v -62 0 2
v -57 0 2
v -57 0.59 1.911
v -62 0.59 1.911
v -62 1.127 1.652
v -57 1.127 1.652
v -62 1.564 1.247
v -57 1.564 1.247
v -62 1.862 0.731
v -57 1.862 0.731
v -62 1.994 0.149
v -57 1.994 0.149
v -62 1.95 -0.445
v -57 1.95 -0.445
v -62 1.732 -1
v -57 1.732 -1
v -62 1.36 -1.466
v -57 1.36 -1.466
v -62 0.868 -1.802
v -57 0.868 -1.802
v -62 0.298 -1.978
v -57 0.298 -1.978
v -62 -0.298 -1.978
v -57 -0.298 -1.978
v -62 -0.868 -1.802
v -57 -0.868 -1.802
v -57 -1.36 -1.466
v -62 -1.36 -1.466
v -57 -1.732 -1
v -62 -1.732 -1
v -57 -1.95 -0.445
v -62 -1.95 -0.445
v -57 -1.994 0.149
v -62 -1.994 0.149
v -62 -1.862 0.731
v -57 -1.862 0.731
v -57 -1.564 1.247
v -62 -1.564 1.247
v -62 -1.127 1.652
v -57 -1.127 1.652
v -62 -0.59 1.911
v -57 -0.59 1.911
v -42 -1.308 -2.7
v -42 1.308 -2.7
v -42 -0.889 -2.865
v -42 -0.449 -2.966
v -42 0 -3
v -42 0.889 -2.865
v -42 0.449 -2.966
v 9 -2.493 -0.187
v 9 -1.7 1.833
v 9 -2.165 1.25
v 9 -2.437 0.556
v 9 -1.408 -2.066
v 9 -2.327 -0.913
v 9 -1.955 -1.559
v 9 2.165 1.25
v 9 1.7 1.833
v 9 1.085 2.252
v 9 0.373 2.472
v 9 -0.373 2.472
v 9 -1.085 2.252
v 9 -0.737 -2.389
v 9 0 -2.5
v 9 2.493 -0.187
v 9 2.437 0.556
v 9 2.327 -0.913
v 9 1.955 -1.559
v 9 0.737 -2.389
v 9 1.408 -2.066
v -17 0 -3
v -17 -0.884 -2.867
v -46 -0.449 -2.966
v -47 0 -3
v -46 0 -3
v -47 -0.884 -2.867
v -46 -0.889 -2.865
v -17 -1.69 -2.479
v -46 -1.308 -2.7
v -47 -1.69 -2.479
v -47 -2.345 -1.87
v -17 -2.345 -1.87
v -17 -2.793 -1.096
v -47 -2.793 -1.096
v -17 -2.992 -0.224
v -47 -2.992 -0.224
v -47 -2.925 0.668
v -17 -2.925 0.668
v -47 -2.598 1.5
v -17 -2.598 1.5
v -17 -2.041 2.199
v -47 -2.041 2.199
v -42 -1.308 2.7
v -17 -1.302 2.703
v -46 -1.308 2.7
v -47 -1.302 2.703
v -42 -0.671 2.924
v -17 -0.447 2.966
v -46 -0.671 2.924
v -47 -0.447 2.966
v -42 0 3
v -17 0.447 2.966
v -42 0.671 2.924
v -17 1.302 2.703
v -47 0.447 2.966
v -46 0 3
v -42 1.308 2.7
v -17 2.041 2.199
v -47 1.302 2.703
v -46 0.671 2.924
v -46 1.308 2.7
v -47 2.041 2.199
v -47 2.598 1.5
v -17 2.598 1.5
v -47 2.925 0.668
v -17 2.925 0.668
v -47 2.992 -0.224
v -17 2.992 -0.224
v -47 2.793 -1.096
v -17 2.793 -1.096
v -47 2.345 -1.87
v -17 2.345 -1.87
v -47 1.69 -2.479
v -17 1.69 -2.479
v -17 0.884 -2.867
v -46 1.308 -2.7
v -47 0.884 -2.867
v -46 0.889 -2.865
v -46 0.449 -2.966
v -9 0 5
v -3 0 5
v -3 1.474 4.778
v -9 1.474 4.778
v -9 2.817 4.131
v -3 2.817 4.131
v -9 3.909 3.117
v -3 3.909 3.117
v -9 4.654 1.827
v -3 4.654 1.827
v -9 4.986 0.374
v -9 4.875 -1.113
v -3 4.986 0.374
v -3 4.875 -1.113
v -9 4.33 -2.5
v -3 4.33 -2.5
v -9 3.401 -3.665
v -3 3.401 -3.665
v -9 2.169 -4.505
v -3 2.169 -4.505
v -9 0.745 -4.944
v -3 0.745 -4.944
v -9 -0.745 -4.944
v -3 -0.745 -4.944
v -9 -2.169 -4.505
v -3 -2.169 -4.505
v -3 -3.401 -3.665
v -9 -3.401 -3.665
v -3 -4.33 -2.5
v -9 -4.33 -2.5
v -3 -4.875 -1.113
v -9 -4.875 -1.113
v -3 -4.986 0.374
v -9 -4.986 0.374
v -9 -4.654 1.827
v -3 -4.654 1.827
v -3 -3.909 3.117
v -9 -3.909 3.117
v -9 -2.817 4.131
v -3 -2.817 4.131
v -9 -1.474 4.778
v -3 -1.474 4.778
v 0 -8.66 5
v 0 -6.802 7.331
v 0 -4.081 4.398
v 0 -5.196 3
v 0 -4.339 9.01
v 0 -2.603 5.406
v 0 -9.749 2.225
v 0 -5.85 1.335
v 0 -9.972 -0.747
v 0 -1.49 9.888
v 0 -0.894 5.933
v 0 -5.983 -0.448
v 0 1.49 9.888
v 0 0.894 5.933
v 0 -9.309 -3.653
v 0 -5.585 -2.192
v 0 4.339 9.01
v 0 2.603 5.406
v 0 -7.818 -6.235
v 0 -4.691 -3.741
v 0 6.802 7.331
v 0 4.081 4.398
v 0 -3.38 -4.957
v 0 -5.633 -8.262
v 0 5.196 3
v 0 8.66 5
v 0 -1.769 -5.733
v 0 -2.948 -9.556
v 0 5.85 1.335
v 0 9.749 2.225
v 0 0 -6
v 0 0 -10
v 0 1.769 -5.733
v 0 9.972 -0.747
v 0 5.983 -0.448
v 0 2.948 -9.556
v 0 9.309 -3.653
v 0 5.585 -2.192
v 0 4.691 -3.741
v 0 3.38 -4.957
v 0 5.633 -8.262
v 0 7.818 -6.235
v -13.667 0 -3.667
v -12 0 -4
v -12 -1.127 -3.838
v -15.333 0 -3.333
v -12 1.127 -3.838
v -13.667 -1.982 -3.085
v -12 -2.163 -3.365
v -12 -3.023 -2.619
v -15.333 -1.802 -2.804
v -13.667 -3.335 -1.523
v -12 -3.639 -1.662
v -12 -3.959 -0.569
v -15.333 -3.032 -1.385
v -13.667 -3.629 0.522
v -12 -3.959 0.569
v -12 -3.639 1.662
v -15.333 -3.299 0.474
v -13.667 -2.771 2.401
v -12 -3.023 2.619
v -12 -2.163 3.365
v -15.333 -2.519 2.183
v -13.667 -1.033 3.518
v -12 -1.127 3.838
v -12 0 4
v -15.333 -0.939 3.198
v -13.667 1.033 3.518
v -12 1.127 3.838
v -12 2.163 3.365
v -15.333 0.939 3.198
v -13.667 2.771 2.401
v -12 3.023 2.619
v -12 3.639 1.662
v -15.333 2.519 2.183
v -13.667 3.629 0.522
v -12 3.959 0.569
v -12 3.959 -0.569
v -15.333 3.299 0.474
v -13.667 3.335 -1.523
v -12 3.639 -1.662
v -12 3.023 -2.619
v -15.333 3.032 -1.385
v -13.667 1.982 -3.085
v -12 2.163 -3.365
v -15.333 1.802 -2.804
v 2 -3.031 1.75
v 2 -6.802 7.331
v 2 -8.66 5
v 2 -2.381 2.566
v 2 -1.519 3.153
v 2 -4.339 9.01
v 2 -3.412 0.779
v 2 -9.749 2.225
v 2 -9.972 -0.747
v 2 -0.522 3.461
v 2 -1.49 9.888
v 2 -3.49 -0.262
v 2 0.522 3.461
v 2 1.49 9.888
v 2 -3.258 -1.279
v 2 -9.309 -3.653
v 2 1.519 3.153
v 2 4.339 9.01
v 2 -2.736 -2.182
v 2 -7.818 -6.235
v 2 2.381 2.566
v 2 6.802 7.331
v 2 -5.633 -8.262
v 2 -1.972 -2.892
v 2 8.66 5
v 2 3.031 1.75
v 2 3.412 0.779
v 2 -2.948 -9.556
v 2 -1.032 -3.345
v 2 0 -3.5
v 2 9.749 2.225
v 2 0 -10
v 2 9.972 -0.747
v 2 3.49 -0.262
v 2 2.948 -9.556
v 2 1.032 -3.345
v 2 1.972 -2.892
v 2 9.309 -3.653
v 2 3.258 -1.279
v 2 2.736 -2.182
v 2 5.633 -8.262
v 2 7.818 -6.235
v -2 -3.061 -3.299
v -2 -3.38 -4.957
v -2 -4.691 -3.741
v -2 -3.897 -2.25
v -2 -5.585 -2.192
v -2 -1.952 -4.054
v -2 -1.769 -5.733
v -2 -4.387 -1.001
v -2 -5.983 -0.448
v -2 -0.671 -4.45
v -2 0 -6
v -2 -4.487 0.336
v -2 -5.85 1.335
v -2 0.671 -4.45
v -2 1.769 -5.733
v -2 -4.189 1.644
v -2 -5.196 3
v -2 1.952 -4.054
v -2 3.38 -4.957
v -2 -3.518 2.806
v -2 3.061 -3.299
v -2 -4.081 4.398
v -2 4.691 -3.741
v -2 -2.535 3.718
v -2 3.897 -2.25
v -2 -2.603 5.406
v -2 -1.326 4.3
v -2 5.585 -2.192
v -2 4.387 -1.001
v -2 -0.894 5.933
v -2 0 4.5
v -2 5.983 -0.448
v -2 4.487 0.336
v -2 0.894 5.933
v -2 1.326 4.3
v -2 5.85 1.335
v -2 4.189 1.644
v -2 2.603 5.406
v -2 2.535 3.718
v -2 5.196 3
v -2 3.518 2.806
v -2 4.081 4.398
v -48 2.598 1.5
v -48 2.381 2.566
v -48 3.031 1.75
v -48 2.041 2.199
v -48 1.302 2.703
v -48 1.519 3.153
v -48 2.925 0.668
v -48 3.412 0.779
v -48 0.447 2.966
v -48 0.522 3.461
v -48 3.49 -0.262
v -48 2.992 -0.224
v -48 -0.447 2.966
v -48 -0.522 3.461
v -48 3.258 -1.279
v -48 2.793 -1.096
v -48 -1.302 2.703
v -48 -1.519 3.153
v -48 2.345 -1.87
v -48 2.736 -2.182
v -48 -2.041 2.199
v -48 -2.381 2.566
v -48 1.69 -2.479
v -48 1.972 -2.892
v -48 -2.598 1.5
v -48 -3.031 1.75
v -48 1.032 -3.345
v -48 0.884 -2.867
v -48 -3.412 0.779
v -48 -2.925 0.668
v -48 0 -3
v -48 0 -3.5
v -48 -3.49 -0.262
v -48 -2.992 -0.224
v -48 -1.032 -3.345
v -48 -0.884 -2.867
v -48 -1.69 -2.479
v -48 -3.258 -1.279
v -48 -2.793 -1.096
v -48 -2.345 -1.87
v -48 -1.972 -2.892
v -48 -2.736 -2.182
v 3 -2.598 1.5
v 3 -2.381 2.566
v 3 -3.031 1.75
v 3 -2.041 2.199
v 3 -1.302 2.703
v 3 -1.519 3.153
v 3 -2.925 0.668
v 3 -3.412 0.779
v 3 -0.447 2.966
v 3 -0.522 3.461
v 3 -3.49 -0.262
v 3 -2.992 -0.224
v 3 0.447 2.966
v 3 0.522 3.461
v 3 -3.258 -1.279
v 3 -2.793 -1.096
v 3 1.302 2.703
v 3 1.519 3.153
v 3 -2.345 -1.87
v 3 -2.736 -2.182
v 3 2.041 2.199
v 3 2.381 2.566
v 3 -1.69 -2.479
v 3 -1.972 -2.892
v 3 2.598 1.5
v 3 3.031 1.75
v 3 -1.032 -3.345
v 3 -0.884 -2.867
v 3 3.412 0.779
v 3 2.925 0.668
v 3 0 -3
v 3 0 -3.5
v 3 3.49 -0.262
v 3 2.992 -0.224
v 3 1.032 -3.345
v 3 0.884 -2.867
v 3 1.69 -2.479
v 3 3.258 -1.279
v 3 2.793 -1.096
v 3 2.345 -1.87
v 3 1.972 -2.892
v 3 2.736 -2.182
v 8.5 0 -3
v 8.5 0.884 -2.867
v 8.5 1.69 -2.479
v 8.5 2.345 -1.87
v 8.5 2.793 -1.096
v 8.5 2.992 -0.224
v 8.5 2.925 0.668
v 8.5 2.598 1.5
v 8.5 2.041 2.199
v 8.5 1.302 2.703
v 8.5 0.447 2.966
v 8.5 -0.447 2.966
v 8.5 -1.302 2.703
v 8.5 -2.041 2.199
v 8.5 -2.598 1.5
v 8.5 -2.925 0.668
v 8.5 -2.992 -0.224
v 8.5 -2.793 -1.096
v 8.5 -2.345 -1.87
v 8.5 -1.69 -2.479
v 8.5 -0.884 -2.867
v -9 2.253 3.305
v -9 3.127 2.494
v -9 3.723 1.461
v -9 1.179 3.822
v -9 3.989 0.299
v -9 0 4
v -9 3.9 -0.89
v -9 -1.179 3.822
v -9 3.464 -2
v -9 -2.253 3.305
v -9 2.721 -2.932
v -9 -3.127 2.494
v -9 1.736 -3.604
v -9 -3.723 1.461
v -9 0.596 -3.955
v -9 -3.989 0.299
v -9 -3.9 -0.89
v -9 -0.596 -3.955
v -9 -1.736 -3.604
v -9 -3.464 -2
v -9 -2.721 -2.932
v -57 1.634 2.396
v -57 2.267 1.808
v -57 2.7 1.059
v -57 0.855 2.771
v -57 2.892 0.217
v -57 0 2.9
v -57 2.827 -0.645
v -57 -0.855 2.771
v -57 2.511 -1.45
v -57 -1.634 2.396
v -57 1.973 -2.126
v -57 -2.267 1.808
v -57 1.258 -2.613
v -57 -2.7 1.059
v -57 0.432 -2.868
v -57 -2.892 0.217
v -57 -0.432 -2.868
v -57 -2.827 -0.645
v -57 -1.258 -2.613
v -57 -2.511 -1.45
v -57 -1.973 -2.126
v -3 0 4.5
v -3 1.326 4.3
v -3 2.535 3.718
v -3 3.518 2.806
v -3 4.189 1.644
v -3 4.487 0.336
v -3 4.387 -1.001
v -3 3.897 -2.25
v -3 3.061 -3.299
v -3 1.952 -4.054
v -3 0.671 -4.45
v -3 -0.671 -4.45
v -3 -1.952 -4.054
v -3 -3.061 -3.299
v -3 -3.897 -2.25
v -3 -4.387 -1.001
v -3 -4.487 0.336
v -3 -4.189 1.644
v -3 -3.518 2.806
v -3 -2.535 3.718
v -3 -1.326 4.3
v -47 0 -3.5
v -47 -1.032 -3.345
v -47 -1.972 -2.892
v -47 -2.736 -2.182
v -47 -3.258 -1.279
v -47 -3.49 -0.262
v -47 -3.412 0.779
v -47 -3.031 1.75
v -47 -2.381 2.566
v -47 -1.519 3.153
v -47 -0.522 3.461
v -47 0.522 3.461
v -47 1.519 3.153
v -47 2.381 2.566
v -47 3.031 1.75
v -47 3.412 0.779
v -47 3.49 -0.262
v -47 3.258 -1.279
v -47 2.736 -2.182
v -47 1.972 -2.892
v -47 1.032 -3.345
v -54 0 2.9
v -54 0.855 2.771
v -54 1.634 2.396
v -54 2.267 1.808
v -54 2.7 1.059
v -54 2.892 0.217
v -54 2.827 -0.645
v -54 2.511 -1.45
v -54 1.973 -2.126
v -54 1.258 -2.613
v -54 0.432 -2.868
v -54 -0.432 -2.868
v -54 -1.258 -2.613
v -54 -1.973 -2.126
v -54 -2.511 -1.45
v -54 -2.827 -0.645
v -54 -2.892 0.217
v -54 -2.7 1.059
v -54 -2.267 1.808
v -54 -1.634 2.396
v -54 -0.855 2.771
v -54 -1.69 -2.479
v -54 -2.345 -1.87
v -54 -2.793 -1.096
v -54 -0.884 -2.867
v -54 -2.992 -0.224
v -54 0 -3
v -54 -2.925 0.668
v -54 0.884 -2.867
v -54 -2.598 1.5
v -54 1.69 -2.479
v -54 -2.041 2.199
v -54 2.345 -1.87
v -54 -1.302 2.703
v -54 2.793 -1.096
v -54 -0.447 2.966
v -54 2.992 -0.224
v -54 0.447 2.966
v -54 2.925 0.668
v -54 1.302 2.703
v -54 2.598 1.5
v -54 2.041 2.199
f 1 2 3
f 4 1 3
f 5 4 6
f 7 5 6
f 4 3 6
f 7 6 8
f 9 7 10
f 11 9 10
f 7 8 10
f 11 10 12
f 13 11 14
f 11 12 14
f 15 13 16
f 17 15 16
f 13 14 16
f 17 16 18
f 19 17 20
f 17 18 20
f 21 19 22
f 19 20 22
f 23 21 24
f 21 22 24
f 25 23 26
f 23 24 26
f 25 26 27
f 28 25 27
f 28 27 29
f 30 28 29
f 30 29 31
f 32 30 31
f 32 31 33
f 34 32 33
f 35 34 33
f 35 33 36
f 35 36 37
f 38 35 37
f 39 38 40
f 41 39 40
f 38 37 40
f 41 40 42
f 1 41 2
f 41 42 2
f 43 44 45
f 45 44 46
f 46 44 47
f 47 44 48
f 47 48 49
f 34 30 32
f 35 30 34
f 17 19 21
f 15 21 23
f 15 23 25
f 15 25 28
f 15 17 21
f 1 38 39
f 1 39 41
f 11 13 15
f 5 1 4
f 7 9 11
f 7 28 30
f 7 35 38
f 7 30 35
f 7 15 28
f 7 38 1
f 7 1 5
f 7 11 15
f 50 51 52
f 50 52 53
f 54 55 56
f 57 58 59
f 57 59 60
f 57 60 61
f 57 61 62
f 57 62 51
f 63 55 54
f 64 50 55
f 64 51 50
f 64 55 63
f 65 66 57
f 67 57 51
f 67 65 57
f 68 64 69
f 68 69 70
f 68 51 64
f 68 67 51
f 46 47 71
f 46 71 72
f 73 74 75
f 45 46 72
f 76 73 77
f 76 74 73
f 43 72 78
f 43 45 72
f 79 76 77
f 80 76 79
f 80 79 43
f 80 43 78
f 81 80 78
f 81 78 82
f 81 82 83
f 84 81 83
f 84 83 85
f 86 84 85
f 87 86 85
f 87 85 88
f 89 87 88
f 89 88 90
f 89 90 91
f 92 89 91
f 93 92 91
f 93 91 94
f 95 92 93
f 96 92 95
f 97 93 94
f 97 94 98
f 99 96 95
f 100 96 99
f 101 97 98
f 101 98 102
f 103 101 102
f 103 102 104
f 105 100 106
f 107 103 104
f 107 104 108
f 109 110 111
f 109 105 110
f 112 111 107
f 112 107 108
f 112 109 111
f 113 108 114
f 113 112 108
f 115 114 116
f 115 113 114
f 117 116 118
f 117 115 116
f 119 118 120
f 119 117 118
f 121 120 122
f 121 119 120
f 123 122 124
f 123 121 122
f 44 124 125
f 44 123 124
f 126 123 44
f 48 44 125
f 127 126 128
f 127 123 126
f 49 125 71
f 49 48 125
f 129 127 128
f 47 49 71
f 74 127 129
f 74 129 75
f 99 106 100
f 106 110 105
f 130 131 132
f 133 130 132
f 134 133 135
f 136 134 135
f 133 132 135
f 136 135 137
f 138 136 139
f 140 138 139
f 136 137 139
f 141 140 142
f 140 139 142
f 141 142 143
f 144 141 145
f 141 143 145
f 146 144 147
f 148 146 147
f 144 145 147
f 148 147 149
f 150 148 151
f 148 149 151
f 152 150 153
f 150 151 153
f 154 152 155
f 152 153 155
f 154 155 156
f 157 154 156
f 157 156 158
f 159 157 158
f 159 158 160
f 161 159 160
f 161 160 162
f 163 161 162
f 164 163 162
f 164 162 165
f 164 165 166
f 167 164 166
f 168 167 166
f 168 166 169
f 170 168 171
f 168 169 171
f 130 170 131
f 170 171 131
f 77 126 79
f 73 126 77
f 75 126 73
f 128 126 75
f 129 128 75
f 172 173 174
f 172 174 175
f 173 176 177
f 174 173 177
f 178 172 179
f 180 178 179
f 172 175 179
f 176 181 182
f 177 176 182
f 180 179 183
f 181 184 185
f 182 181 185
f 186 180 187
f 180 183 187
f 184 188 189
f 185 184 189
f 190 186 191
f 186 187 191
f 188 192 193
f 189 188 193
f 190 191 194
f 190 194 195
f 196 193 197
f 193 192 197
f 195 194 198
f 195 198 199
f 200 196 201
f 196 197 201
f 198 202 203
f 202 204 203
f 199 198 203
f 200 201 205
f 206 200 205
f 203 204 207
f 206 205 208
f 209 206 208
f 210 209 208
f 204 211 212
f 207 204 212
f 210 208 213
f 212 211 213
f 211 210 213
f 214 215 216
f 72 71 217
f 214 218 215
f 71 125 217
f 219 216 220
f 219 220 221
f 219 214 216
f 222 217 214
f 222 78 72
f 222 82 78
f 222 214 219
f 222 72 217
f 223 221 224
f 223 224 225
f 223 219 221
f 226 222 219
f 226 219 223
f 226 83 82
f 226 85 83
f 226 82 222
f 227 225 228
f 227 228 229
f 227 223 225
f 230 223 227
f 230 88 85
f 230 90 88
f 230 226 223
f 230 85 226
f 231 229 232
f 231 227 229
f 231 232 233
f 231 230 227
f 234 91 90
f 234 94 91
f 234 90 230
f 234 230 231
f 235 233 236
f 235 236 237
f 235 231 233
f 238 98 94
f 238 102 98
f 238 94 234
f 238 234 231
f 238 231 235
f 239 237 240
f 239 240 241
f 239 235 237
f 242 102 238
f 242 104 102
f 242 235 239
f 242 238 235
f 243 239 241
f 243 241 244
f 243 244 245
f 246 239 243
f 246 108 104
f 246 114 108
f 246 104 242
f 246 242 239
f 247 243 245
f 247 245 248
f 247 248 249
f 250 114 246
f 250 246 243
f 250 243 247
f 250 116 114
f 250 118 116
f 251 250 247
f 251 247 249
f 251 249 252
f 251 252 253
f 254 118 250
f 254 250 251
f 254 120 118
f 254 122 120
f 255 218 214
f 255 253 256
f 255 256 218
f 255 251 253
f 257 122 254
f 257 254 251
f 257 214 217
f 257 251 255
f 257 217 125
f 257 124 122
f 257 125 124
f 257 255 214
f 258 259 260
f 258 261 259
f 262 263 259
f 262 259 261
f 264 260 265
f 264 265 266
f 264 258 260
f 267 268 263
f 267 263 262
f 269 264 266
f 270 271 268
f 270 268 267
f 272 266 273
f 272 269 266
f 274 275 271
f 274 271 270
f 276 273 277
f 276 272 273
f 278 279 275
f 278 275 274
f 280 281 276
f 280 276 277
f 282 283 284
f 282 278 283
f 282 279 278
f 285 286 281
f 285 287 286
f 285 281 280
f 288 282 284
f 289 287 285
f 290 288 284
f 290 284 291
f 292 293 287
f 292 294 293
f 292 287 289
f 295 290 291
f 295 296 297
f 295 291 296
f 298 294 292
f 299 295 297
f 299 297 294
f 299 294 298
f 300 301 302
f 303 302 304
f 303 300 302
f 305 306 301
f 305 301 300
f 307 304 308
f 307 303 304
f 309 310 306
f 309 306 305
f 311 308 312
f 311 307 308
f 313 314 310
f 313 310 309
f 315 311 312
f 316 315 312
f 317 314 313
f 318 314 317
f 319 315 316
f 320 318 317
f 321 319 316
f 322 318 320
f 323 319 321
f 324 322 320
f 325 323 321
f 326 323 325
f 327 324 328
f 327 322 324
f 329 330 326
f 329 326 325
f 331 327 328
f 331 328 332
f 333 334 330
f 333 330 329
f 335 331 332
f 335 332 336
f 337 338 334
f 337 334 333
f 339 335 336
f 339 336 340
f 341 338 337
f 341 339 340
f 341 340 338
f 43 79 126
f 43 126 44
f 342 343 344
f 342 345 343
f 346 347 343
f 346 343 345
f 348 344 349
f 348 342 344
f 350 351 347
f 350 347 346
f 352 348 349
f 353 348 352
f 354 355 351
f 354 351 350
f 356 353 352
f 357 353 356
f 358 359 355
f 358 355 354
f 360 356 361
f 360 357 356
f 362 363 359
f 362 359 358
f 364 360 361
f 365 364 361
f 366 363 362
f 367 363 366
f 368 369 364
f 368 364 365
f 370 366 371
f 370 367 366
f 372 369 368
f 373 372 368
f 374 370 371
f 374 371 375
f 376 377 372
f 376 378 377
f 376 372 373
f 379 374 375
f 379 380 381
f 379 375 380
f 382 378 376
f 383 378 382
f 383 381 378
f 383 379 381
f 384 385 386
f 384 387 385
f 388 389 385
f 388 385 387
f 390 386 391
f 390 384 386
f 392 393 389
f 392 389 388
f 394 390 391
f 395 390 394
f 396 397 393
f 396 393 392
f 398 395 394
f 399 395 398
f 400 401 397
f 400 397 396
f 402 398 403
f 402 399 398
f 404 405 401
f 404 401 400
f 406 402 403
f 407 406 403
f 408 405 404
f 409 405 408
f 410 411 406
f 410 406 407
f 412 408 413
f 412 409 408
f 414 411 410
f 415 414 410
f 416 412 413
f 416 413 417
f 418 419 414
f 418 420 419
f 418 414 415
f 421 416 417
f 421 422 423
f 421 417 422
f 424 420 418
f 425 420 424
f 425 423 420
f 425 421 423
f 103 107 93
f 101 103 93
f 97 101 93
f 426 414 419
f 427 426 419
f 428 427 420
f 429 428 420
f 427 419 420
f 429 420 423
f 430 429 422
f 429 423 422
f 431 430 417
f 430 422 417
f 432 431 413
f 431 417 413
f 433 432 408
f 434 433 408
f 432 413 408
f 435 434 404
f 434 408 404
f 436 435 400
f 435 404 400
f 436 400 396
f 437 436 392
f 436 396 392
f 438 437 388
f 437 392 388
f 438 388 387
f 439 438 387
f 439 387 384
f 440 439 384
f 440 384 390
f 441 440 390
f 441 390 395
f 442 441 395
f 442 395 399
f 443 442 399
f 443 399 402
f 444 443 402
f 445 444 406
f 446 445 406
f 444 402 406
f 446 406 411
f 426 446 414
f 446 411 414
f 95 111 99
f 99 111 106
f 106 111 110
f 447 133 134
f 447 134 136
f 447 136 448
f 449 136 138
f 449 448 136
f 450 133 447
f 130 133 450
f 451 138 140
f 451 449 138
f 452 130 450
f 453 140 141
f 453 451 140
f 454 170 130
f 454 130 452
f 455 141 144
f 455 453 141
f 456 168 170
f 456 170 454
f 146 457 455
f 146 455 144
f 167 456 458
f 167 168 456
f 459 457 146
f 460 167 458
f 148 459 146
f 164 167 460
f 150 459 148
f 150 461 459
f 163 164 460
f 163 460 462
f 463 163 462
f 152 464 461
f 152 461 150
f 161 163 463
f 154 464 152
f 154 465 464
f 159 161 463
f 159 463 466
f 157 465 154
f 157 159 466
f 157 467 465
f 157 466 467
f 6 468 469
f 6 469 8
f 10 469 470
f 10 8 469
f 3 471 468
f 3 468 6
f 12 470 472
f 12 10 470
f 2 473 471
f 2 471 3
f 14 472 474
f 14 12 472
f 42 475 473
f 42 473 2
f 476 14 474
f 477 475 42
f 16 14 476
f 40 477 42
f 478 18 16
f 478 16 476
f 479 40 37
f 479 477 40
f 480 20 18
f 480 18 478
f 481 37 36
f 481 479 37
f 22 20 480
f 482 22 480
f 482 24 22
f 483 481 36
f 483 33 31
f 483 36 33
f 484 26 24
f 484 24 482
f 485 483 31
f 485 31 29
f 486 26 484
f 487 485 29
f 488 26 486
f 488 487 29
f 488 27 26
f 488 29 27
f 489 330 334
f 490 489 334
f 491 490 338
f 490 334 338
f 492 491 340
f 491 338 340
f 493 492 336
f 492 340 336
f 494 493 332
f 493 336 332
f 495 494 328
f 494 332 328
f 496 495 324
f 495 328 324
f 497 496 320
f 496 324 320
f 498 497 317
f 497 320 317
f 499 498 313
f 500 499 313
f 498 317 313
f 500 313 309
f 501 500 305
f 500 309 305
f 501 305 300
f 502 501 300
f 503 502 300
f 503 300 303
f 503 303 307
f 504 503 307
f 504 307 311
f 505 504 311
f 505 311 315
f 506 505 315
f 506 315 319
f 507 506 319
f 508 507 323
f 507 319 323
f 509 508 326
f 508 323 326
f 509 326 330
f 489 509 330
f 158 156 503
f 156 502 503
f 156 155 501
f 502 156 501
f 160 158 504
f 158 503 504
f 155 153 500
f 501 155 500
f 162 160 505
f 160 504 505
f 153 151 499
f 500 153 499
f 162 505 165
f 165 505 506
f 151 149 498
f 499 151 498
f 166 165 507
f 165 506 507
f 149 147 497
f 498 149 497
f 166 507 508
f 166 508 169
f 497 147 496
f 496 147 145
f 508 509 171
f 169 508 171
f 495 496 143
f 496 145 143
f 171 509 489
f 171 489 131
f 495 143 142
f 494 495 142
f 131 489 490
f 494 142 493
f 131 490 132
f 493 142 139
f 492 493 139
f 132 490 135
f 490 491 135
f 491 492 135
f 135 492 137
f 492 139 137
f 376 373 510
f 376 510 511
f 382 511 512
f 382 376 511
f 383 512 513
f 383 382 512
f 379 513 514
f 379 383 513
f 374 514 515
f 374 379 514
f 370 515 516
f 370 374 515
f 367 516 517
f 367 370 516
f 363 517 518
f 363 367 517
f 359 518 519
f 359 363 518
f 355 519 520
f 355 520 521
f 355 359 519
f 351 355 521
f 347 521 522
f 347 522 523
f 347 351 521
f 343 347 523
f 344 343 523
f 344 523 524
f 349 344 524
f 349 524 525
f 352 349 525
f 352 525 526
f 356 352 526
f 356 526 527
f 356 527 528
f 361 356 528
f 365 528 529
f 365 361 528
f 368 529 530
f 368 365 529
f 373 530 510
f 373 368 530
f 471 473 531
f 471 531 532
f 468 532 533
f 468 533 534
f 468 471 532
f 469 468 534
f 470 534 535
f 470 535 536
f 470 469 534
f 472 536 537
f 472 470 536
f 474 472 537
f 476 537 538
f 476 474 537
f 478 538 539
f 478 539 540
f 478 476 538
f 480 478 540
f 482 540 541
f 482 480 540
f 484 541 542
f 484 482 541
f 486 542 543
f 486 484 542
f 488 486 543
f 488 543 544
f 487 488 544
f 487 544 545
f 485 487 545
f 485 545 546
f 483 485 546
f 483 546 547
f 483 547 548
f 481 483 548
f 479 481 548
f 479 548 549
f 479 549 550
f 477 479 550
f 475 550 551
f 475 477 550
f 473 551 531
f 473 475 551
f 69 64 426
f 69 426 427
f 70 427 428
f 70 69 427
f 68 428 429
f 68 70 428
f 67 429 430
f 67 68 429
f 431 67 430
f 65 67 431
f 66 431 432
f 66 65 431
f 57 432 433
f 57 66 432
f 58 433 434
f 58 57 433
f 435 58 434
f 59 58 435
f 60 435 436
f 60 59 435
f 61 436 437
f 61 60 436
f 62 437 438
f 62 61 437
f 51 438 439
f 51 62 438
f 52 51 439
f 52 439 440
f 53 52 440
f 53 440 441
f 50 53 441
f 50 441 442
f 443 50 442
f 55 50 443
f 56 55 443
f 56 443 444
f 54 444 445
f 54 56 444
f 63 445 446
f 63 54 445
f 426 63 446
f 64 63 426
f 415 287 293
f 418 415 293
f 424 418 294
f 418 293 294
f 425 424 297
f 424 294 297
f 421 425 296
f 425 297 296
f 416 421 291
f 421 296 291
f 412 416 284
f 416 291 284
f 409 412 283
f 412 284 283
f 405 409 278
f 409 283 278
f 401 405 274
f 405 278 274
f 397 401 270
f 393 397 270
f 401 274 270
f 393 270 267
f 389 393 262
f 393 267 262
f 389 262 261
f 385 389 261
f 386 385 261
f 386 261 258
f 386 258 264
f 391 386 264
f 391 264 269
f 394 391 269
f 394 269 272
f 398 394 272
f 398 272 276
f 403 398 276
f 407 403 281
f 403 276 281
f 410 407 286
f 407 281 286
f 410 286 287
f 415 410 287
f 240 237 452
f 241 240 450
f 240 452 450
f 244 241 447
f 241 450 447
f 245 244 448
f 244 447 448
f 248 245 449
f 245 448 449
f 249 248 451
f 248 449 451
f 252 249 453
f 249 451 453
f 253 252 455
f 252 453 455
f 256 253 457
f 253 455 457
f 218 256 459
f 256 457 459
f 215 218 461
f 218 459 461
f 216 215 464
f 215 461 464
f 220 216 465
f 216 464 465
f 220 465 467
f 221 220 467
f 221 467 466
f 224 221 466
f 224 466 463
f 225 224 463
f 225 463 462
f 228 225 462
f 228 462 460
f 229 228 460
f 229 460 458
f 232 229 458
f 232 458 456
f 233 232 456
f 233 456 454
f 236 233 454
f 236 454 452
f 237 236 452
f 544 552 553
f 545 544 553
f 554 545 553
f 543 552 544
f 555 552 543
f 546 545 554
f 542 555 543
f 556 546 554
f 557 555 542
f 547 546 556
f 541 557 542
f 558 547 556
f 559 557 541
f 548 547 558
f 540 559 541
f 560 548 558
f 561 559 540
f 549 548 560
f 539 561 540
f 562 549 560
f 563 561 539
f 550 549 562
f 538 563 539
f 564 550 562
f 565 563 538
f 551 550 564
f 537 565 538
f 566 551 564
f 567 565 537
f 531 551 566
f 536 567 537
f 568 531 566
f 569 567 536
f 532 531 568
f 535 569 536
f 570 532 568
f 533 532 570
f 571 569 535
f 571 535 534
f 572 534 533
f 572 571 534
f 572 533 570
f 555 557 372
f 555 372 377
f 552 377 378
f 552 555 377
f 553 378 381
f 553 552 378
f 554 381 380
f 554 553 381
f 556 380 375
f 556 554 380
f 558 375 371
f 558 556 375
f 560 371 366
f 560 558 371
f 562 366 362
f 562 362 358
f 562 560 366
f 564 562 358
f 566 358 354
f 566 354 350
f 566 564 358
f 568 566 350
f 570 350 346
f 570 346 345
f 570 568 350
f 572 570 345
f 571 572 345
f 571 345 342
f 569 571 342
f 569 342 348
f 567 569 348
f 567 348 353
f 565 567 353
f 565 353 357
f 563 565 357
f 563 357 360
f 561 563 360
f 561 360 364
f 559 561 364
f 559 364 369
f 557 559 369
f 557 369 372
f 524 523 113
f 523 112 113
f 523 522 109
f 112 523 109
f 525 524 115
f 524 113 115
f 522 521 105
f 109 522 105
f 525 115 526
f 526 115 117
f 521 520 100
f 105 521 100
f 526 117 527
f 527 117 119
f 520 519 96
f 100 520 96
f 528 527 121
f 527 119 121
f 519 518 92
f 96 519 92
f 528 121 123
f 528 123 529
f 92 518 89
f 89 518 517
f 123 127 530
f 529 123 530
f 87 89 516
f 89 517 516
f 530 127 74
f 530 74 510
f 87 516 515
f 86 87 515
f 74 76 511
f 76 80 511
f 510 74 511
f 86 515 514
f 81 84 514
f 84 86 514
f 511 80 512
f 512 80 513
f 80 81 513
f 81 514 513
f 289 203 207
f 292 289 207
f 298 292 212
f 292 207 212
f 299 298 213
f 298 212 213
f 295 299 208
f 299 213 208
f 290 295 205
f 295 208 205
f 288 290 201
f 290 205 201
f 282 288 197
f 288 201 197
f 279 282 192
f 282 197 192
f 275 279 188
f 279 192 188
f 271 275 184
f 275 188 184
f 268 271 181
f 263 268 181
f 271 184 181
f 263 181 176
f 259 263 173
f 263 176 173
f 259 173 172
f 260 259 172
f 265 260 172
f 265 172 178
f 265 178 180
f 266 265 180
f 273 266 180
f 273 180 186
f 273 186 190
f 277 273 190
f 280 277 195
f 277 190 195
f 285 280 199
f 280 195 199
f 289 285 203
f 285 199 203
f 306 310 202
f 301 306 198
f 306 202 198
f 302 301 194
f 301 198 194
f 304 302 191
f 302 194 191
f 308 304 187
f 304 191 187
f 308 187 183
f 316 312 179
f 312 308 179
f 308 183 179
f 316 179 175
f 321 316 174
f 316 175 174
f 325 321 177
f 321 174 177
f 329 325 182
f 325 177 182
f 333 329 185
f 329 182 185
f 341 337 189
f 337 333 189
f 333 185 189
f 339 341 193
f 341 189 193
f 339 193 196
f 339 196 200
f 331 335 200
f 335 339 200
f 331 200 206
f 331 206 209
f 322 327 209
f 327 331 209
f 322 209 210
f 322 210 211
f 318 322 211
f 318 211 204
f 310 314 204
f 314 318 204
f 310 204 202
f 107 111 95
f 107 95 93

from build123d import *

# Parameters (mm, degrees)
SKETCH_1_R          = 10
EXTRUDE_1_DEPTH     = 2
SKETCH_2_R          = 3.5
EXTRUDE_2_DEPTH     = 1
SKETCH_3_R          = 6
EXTRUDE_3_DEPTH     = 9
SKETCH_4_R          = 4
EXTRUDE_4_DEPTH     = 3
SKETCH_5_R          = 3
EXTRUDE_5_DEPTH     = 6
EXTRUDE_START       = 35
SKETCH_6_R          = 3
EXTRUDE_6_DEPTH     = 35
EXTRUDE_START_2     = 1
SKETCH_7_R          = 3.5
EXTRUDE_7_DEPTH     = 1
EXTRUDE_START_3     = 9
SKETCH_8_R          = 3
EXTRUDE_8_DEPTH     = 9
SKETCH_9_R          = 2
EXTRUDE_9_DEPTH     = 5
CHAMFER_1_SIZE      = 0.5
SKETCH_11_W         = 4
SKETCH_11_H         = 0.3
CUT_EXTRUDE_2_DEPTH = 5
CUT_EXTRUDE_START   = 2
SKETCH_12_R         = 6
SKETCH_12_R_2       = 4.5
CUT_EXTRUDE_3_DEPTH = 1
CUT_EXTRUDE_START_2 = -6
SKETCH_13_R         = 6
SKETCH_13_R_2       = 5
CUT_EXTRUDE_4_DEPTH = 6
SKETCH_15_R         = 3
SKETCH_15_R_2       = 2.9
CUT_EXTRUDE_5_DEPTH = 3


with BuildPart() as part:
    # 草图1 → 凸台-拉伸1 (new body)
    with BuildSketch(Plane(origin=(0, 0, 0), x_dir=(0, 0, -1), z_dir=(1, 0, 0))):
        Circle(SKETCH_1_R)
    extrude(amount=EXTRUDE_1_DEPTH)

    # 草图2 → 凸台-拉伸2 (add)
    with BuildSketch(Plane(origin=(2, 0, 0), x_dir=(0, 0, -1), z_dir=(1, 0, 0))):
        Circle(SKETCH_2_R)
    extrude(amount=EXTRUDE_2_DEPTH)

    # 草图3 → 凸台-拉伸3 (add)
    with BuildSketch(Plane.ZY):
        with Locations(Location((0, 0, 0), (0, 0, 180))):
            Circle(SKETCH_3_R)
    extrude(amount=EXTRUDE_3_DEPTH)

    # 草图4 → 凸台-拉伸4 (add)
    with BuildSketch(Plane.ZY.offset(9)):
        Circle(SKETCH_4_R)
    extrude(amount=EXTRUDE_4_DEPTH)

    # 草图5 → 凸台-拉伸5 (add)
    with BuildSketch(Plane(origin=(3, 0, 0), x_dir=(0, 0, -1), z_dir=(1, 0, 0))):
        Circle(SKETCH_5_R)
    extrude(amount=EXTRUDE_5_DEPTH)

    # 草图6 → 凸台-拉伸6 (add)
    with BuildSketch(Plane.ZY.offset(12).offset(EXTRUDE_START)):
        with Locations(Location((0, 0, 0), (0, 0, 180))):
            Circle(SKETCH_6_R)
    extrude(amount=-EXTRUDE_6_DEPTH)

    # 草图7 → 凸台-拉伸7 (add)
    with BuildSketch(Plane.ZY.offset(47).offset(EXTRUDE_START_2)):
        with Locations(Location((0, 0, 0), (0, 0, 180))):
            Circle(SKETCH_7_R)
    extrude(amount=-EXTRUDE_7_DEPTH)

    # 草图8 → 凸台-拉伸8 (add)
    with BuildSketch(Plane.ZY.offset(48).offset(EXTRUDE_START_3)):
        with Locations(Location((0, 0, 0), (0, 0, 180))):
            Circle(SKETCH_8_R)
    extrude(amount=-EXTRUDE_8_DEPTH)

    # 草图9 → 凸台-拉伸9 (add)
    with BuildSketch(Plane.ZY.offset(57)):
        Circle(SKETCH_9_R)
    extrude(amount=EXTRUDE_9_DEPTH)

    # 倒角1
    chamfer_1_edges = [part.edges().sort_by_distance(p)[0] for p in [
        (9, 0, 3),
    ]]
    chamfer(chamfer_1_edges, length=CHAMFER_1_SIZE)

    # 草图11 → 切除-拉伸2 (cut, symmetric)
    with BuildSketch(Plane(origin=(0, 0, 0), x_dir=(1, 0, 0), z_dir=(0, 1, 0))):
        with Locations((-44, 2.85)):
            Rectangle(SKETCH_11_W, SKETCH_11_H)
        with Locations((-44, -2.85)):
            Rectangle(SKETCH_11_W, SKETCH_11_H)
    extrude(amount=CUT_EXTRUDE_2_DEPTH, both=True, mode=Mode.SUBTRACT)

    # 草图12 → 切除-拉伸3 (cut)
    with BuildSketch(Plane.ZY.offset(CUT_EXTRUDE_START)):
        Circle(SKETCH_12_R)
        Circle(SKETCH_12_R_2, mode=Mode.SUBTRACT)
    extrude(amount=CUT_EXTRUDE_3_DEPTH, mode=Mode.SUBTRACT)

    # 草图13 → 切除-拉伸4 (cut)
    with BuildSketch(Plane.ZY.offset(9).offset(CUT_EXTRUDE_START_2)):
        with Locations(Location((0, 0, 0), (0, 0, 180))):
            Circle(SKETCH_13_R)
        Circle(SKETCH_13_R_2, mode=Mode.SUBTRACT)
    extrude(amount=CUT_EXTRUDE_4_DEPTH, mode=Mode.SUBTRACT)

    # 草图14 → 旋转1 (revolve)
    with BuildSketch(Plane.XY, mode=Mode.PRIVATE) as revolve_1_sk:
        Polygon((-12, 4), (-17, 3), (-12, 3), align=None)
    revolve(revolve_1_sk.sketch.rotate(Axis((-6.238584256, 0, 0), (-1, 0, 0)), 90), axis=Axis((-6.238584256, 0, 0), (-1, 0, 0)))

    # 草图15 → 切除-拉伸5 (cut)
    with BuildSketch(Plane.ZY.offset(57)):
        Circle(SKETCH_15_R)
        Circle(SKETCH_15_R_2, mode=Mode.SUBTRACT)
    extrude(amount=-CUT_EXTRUDE_5_DEPTH, mode=Mode.SUBTRACT)


solid = part.part
